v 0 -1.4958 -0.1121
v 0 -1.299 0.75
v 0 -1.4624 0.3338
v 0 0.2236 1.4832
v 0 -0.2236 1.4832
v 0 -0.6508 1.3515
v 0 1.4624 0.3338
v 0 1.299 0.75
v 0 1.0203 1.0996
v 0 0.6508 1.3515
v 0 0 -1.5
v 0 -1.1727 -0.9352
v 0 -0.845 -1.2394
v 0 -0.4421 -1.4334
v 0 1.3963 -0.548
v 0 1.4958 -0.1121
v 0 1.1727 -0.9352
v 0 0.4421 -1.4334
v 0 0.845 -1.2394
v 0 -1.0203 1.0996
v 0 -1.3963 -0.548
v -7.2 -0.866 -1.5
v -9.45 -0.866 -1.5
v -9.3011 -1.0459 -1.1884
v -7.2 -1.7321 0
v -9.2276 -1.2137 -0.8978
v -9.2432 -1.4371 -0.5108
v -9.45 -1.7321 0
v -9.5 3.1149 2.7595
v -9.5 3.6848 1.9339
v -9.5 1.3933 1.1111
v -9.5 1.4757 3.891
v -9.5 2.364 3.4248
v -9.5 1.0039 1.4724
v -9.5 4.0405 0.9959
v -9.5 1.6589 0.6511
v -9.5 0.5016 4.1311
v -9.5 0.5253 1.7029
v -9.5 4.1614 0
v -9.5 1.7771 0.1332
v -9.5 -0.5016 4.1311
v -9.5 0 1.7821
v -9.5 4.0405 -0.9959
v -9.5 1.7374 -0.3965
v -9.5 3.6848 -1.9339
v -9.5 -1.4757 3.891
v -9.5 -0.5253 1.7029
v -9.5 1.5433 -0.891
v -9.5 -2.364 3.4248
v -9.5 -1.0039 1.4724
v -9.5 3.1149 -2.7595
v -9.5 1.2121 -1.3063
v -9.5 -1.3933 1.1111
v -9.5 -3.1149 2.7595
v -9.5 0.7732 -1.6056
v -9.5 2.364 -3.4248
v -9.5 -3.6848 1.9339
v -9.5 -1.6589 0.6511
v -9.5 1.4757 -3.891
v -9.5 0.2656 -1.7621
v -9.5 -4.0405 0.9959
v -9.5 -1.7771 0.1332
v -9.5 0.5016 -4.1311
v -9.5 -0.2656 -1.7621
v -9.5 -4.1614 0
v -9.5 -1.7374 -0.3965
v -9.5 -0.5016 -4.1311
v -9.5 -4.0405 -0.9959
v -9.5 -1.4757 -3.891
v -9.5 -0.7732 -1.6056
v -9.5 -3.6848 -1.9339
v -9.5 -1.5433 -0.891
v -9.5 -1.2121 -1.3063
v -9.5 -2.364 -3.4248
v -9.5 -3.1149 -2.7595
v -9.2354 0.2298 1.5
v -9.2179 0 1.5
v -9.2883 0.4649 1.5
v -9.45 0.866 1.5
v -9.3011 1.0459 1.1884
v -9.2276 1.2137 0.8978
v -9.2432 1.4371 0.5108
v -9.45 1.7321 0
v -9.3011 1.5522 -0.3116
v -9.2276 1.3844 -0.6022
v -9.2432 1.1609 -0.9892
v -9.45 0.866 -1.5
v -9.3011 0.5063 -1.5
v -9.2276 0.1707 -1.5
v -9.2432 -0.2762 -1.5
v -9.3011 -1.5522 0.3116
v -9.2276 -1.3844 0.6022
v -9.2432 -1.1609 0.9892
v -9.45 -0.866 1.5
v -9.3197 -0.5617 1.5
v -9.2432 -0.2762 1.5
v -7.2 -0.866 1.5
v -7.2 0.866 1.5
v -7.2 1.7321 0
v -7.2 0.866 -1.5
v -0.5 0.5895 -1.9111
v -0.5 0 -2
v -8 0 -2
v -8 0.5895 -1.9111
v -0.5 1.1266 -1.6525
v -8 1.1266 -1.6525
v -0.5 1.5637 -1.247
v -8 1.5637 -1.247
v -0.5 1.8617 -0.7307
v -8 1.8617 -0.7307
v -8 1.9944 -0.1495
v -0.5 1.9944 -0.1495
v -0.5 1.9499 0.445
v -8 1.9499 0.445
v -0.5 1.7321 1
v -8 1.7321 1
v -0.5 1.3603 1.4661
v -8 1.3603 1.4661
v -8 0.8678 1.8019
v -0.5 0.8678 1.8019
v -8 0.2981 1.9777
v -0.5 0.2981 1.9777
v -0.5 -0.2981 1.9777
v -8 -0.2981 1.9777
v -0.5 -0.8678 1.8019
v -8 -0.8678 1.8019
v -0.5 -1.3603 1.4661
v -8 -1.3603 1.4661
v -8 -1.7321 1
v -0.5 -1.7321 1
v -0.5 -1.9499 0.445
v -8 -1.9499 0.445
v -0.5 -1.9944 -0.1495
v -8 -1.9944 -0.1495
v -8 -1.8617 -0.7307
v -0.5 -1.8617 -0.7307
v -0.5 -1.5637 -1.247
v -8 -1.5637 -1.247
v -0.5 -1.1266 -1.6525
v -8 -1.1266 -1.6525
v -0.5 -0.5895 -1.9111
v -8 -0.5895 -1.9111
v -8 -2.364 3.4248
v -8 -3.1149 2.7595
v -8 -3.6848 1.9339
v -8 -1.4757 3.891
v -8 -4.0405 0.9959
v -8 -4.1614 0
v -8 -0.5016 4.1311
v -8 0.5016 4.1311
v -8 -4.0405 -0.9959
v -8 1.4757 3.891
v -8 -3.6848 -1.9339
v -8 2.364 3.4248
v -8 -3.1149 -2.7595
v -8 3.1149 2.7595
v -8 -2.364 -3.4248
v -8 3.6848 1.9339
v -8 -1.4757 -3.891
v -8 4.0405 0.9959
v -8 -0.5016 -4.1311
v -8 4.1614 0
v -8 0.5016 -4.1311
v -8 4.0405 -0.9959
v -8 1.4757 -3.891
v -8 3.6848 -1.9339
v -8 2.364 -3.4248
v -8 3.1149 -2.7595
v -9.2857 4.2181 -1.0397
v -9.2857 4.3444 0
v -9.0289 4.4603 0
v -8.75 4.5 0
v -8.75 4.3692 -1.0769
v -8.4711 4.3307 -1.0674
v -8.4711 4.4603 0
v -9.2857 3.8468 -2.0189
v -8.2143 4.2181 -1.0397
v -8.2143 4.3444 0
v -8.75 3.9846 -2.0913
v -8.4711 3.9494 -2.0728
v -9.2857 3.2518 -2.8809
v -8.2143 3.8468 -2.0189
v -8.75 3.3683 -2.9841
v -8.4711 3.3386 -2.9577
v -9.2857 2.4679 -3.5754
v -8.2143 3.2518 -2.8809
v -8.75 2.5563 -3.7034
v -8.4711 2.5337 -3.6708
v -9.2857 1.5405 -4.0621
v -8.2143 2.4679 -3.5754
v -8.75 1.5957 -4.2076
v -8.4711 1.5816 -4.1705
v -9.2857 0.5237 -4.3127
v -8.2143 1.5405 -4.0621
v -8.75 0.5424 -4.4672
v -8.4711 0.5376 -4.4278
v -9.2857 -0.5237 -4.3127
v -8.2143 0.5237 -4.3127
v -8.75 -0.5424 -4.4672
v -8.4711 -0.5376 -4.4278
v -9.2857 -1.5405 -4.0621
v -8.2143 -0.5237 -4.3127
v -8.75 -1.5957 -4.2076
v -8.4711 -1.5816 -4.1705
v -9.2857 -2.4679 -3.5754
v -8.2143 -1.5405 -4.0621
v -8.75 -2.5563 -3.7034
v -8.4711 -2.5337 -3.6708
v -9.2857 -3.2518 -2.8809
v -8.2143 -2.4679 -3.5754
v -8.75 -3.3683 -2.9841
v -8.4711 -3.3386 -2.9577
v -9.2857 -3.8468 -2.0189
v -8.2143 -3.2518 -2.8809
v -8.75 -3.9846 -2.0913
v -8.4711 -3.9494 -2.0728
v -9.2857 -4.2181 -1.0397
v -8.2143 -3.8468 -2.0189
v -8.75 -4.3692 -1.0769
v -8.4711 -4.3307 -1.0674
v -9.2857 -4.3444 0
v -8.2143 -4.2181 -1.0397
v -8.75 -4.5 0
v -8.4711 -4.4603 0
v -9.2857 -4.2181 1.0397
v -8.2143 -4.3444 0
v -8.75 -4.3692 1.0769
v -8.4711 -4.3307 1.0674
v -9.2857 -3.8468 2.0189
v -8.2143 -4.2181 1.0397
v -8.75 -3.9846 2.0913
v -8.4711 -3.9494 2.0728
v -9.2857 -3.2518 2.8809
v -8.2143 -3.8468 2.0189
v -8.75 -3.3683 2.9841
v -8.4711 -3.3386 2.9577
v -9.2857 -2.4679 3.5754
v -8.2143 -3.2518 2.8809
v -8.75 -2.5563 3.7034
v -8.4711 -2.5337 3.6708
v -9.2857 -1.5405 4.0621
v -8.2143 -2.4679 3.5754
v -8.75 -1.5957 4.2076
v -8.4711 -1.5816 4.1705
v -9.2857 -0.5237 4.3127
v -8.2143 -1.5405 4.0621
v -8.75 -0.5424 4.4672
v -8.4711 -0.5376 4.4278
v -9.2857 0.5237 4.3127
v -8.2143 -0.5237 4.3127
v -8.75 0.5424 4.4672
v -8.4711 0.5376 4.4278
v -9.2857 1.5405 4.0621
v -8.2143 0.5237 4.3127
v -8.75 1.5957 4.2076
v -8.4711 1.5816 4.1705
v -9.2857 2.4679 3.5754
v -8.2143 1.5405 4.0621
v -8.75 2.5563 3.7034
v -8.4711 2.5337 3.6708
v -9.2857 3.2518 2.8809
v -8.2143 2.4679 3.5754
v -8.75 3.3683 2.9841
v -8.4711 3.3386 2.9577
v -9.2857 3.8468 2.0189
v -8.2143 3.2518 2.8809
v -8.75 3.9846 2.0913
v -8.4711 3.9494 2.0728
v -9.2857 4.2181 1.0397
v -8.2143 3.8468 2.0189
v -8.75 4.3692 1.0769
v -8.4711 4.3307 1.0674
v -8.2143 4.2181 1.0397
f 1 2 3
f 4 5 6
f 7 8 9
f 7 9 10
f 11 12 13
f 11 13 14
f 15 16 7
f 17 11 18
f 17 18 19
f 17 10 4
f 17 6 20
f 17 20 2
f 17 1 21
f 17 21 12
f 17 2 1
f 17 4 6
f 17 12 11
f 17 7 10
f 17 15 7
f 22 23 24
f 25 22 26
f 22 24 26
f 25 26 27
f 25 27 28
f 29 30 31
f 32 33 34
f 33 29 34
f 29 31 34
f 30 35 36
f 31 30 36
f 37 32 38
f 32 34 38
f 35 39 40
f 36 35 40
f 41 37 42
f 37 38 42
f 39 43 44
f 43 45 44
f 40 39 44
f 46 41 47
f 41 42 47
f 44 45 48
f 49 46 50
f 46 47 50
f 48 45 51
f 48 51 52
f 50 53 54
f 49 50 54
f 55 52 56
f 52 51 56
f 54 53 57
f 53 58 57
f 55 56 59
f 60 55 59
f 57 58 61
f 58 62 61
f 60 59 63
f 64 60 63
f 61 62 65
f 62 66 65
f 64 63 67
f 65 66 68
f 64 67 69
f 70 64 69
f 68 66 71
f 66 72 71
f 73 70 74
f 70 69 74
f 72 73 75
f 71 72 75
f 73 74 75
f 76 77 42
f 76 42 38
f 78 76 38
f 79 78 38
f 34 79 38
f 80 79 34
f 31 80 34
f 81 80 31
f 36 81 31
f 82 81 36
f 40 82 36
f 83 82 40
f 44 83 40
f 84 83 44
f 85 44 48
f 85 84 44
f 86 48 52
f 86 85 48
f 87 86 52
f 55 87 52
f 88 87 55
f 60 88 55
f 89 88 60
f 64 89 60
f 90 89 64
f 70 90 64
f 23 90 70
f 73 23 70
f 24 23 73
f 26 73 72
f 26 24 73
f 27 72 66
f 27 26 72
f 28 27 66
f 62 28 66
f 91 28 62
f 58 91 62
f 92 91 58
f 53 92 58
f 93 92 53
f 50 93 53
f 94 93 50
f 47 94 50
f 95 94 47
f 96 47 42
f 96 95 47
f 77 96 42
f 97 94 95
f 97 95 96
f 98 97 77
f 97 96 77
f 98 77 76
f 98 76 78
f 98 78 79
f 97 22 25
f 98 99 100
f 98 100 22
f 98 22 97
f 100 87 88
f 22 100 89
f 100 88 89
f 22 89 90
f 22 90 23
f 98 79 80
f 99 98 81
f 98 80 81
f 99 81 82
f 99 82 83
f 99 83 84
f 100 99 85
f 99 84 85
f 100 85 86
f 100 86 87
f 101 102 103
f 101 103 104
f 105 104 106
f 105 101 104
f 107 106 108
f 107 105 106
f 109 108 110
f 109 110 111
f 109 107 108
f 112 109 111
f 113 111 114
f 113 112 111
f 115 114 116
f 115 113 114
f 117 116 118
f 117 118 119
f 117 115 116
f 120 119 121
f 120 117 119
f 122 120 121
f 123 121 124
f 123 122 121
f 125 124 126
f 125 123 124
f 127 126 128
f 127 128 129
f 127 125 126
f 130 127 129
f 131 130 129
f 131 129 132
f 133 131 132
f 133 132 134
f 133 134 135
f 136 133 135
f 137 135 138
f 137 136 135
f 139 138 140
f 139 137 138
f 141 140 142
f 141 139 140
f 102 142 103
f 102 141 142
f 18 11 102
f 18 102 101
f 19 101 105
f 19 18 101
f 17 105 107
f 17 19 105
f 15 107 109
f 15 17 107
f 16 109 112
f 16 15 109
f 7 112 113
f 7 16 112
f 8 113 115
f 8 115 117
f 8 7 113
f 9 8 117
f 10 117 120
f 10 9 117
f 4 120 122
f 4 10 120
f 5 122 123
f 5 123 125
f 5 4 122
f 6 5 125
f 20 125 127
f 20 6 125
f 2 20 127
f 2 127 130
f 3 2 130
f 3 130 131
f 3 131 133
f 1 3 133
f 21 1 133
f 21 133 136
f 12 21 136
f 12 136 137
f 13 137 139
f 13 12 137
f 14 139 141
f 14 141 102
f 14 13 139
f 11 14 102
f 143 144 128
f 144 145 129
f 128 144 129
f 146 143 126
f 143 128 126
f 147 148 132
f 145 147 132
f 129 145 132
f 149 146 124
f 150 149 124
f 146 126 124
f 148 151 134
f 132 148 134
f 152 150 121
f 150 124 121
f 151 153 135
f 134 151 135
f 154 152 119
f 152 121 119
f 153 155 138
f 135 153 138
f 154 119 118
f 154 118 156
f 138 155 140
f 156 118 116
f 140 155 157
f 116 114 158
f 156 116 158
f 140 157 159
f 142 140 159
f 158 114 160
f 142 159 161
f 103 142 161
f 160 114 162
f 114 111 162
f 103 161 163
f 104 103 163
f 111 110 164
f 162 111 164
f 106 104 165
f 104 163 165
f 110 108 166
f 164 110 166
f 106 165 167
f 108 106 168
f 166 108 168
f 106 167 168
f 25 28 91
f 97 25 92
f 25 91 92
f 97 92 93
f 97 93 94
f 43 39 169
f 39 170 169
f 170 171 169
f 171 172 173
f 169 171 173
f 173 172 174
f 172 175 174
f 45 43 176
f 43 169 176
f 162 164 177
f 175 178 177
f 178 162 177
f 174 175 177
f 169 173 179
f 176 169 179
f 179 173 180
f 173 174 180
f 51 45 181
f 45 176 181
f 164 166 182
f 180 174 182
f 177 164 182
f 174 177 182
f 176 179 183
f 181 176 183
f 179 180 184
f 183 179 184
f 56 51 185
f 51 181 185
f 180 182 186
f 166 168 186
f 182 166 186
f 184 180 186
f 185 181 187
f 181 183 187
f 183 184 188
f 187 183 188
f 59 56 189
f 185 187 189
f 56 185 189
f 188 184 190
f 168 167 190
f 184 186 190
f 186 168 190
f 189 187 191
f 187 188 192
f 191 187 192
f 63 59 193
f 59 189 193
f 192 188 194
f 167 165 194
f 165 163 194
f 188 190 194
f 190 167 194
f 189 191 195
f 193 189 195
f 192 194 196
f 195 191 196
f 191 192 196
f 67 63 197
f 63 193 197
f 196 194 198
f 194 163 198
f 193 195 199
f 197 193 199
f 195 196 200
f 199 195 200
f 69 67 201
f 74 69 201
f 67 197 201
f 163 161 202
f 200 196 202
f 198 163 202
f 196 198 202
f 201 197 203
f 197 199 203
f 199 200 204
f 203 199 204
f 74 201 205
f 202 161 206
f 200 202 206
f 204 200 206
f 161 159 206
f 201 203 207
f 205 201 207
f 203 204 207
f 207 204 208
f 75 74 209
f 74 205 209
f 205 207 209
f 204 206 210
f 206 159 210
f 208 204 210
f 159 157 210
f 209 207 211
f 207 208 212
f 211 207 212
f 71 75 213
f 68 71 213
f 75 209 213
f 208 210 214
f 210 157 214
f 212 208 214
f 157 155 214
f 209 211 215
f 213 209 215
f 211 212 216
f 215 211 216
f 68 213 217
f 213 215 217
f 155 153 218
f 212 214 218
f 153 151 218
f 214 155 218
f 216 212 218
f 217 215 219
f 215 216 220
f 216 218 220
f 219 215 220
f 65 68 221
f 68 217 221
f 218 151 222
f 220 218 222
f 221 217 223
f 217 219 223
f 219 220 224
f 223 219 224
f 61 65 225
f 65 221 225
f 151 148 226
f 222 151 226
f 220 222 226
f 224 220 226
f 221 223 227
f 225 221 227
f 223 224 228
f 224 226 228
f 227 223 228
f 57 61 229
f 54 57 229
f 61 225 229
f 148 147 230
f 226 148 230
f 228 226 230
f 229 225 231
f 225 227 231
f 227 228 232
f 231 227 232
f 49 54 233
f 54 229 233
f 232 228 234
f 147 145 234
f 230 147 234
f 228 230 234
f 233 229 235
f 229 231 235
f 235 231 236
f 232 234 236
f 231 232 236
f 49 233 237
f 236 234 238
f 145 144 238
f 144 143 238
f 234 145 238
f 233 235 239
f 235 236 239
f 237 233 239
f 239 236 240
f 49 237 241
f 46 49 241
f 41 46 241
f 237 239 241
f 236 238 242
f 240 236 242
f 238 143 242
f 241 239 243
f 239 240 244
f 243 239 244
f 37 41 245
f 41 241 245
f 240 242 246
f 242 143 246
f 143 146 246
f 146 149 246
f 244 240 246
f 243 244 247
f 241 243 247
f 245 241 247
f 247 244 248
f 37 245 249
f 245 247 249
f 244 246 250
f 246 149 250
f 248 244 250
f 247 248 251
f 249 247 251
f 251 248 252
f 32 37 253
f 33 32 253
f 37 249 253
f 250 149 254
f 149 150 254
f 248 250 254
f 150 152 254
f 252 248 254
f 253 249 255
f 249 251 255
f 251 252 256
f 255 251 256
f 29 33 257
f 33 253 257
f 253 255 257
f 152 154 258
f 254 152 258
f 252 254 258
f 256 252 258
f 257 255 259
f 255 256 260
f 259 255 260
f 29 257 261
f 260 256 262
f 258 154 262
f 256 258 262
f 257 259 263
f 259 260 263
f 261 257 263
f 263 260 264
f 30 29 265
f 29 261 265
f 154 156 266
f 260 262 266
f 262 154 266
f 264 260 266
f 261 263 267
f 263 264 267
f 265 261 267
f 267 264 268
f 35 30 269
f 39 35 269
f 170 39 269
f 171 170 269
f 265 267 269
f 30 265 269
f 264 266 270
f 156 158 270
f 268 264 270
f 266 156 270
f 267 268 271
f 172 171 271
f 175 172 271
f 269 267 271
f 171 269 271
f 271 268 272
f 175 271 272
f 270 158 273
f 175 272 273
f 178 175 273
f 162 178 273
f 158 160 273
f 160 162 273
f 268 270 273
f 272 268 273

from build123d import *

# Parameters (mm, degrees)
SKETCH2_R           = 2
BOSS_EXTRUDE1_DEPTH = 8
CHAMFER1_SIZE       = 0.5
CUT_EXTRUDE1_DEPTH  = 2.3
SKETCH8_R           = 1.782050808
CUT_EXTRUDE2_DEPTH  = 1
CUT_EXTRUDE2_TAPER  = 45


with BuildPart() as part:
    # Sketch2 → Boss-Extrude1 (new body)
    with BuildSketch(Plane(origin=(0, 0, 0), x_dir=(0, 0, -1), z_dir=(1, 0, 0))):
        Circle(SKETCH2_R)
    extrude(amount=-BOSS_EXTRUDE1_DEPTH)

    # Chamfer1
    chamfer1_edges = [part.edges().sort_by_distance(p)[0] for p in [
        (0, 0, 2),
    ]]
    chamfer(chamfer1_edges, length=CHAMFER1_SIZE)

    # Sketch6 → Revolve1 (revolve)
    with BuildSketch(Plane.XY):
        with BuildLine():
            Line((-9.5, 0), (-9.5, 4.161437828))
            ThreePointArc((-9.5, 4.161437828), (-8.75, 4.5), (-8, 4.161437828))
            Line((-8, 4.161437828), (-8, 0))
            Line((-8, 0), (-9.5, 0))
        make_face()
    revolve(axis=Axis((-8, 0, 0), (-1, 0, 0)))

    # Sketch7 → Cut-Extrude1 (cut)
    with BuildSketch(Plane.ZY.offset(9.5)):
        Polygon((0, 1.732050808), (-1.5, 0.866025404), (-1.5, -0.866025404), (0, -1.732050808), (1.5, -0.866025404), (1.5, 0.866025404), align=None)
    extrude(amount=-CUT_EXTRUDE1_DEPTH, mode=Mode.SUBTRACT)

    # Sketch8 → Cut-Extrude2 (cut)
    with BuildSketch(Plane.ZY.offset(9.5)):
        Circle(SKETCH8_R)
    extrude(amount=-CUT_EXTRUDE2_DEPTH, taper=CUT_EXTRUDE2_TAPER, mode=Mode.SUBTRACT)


solid = part.part
